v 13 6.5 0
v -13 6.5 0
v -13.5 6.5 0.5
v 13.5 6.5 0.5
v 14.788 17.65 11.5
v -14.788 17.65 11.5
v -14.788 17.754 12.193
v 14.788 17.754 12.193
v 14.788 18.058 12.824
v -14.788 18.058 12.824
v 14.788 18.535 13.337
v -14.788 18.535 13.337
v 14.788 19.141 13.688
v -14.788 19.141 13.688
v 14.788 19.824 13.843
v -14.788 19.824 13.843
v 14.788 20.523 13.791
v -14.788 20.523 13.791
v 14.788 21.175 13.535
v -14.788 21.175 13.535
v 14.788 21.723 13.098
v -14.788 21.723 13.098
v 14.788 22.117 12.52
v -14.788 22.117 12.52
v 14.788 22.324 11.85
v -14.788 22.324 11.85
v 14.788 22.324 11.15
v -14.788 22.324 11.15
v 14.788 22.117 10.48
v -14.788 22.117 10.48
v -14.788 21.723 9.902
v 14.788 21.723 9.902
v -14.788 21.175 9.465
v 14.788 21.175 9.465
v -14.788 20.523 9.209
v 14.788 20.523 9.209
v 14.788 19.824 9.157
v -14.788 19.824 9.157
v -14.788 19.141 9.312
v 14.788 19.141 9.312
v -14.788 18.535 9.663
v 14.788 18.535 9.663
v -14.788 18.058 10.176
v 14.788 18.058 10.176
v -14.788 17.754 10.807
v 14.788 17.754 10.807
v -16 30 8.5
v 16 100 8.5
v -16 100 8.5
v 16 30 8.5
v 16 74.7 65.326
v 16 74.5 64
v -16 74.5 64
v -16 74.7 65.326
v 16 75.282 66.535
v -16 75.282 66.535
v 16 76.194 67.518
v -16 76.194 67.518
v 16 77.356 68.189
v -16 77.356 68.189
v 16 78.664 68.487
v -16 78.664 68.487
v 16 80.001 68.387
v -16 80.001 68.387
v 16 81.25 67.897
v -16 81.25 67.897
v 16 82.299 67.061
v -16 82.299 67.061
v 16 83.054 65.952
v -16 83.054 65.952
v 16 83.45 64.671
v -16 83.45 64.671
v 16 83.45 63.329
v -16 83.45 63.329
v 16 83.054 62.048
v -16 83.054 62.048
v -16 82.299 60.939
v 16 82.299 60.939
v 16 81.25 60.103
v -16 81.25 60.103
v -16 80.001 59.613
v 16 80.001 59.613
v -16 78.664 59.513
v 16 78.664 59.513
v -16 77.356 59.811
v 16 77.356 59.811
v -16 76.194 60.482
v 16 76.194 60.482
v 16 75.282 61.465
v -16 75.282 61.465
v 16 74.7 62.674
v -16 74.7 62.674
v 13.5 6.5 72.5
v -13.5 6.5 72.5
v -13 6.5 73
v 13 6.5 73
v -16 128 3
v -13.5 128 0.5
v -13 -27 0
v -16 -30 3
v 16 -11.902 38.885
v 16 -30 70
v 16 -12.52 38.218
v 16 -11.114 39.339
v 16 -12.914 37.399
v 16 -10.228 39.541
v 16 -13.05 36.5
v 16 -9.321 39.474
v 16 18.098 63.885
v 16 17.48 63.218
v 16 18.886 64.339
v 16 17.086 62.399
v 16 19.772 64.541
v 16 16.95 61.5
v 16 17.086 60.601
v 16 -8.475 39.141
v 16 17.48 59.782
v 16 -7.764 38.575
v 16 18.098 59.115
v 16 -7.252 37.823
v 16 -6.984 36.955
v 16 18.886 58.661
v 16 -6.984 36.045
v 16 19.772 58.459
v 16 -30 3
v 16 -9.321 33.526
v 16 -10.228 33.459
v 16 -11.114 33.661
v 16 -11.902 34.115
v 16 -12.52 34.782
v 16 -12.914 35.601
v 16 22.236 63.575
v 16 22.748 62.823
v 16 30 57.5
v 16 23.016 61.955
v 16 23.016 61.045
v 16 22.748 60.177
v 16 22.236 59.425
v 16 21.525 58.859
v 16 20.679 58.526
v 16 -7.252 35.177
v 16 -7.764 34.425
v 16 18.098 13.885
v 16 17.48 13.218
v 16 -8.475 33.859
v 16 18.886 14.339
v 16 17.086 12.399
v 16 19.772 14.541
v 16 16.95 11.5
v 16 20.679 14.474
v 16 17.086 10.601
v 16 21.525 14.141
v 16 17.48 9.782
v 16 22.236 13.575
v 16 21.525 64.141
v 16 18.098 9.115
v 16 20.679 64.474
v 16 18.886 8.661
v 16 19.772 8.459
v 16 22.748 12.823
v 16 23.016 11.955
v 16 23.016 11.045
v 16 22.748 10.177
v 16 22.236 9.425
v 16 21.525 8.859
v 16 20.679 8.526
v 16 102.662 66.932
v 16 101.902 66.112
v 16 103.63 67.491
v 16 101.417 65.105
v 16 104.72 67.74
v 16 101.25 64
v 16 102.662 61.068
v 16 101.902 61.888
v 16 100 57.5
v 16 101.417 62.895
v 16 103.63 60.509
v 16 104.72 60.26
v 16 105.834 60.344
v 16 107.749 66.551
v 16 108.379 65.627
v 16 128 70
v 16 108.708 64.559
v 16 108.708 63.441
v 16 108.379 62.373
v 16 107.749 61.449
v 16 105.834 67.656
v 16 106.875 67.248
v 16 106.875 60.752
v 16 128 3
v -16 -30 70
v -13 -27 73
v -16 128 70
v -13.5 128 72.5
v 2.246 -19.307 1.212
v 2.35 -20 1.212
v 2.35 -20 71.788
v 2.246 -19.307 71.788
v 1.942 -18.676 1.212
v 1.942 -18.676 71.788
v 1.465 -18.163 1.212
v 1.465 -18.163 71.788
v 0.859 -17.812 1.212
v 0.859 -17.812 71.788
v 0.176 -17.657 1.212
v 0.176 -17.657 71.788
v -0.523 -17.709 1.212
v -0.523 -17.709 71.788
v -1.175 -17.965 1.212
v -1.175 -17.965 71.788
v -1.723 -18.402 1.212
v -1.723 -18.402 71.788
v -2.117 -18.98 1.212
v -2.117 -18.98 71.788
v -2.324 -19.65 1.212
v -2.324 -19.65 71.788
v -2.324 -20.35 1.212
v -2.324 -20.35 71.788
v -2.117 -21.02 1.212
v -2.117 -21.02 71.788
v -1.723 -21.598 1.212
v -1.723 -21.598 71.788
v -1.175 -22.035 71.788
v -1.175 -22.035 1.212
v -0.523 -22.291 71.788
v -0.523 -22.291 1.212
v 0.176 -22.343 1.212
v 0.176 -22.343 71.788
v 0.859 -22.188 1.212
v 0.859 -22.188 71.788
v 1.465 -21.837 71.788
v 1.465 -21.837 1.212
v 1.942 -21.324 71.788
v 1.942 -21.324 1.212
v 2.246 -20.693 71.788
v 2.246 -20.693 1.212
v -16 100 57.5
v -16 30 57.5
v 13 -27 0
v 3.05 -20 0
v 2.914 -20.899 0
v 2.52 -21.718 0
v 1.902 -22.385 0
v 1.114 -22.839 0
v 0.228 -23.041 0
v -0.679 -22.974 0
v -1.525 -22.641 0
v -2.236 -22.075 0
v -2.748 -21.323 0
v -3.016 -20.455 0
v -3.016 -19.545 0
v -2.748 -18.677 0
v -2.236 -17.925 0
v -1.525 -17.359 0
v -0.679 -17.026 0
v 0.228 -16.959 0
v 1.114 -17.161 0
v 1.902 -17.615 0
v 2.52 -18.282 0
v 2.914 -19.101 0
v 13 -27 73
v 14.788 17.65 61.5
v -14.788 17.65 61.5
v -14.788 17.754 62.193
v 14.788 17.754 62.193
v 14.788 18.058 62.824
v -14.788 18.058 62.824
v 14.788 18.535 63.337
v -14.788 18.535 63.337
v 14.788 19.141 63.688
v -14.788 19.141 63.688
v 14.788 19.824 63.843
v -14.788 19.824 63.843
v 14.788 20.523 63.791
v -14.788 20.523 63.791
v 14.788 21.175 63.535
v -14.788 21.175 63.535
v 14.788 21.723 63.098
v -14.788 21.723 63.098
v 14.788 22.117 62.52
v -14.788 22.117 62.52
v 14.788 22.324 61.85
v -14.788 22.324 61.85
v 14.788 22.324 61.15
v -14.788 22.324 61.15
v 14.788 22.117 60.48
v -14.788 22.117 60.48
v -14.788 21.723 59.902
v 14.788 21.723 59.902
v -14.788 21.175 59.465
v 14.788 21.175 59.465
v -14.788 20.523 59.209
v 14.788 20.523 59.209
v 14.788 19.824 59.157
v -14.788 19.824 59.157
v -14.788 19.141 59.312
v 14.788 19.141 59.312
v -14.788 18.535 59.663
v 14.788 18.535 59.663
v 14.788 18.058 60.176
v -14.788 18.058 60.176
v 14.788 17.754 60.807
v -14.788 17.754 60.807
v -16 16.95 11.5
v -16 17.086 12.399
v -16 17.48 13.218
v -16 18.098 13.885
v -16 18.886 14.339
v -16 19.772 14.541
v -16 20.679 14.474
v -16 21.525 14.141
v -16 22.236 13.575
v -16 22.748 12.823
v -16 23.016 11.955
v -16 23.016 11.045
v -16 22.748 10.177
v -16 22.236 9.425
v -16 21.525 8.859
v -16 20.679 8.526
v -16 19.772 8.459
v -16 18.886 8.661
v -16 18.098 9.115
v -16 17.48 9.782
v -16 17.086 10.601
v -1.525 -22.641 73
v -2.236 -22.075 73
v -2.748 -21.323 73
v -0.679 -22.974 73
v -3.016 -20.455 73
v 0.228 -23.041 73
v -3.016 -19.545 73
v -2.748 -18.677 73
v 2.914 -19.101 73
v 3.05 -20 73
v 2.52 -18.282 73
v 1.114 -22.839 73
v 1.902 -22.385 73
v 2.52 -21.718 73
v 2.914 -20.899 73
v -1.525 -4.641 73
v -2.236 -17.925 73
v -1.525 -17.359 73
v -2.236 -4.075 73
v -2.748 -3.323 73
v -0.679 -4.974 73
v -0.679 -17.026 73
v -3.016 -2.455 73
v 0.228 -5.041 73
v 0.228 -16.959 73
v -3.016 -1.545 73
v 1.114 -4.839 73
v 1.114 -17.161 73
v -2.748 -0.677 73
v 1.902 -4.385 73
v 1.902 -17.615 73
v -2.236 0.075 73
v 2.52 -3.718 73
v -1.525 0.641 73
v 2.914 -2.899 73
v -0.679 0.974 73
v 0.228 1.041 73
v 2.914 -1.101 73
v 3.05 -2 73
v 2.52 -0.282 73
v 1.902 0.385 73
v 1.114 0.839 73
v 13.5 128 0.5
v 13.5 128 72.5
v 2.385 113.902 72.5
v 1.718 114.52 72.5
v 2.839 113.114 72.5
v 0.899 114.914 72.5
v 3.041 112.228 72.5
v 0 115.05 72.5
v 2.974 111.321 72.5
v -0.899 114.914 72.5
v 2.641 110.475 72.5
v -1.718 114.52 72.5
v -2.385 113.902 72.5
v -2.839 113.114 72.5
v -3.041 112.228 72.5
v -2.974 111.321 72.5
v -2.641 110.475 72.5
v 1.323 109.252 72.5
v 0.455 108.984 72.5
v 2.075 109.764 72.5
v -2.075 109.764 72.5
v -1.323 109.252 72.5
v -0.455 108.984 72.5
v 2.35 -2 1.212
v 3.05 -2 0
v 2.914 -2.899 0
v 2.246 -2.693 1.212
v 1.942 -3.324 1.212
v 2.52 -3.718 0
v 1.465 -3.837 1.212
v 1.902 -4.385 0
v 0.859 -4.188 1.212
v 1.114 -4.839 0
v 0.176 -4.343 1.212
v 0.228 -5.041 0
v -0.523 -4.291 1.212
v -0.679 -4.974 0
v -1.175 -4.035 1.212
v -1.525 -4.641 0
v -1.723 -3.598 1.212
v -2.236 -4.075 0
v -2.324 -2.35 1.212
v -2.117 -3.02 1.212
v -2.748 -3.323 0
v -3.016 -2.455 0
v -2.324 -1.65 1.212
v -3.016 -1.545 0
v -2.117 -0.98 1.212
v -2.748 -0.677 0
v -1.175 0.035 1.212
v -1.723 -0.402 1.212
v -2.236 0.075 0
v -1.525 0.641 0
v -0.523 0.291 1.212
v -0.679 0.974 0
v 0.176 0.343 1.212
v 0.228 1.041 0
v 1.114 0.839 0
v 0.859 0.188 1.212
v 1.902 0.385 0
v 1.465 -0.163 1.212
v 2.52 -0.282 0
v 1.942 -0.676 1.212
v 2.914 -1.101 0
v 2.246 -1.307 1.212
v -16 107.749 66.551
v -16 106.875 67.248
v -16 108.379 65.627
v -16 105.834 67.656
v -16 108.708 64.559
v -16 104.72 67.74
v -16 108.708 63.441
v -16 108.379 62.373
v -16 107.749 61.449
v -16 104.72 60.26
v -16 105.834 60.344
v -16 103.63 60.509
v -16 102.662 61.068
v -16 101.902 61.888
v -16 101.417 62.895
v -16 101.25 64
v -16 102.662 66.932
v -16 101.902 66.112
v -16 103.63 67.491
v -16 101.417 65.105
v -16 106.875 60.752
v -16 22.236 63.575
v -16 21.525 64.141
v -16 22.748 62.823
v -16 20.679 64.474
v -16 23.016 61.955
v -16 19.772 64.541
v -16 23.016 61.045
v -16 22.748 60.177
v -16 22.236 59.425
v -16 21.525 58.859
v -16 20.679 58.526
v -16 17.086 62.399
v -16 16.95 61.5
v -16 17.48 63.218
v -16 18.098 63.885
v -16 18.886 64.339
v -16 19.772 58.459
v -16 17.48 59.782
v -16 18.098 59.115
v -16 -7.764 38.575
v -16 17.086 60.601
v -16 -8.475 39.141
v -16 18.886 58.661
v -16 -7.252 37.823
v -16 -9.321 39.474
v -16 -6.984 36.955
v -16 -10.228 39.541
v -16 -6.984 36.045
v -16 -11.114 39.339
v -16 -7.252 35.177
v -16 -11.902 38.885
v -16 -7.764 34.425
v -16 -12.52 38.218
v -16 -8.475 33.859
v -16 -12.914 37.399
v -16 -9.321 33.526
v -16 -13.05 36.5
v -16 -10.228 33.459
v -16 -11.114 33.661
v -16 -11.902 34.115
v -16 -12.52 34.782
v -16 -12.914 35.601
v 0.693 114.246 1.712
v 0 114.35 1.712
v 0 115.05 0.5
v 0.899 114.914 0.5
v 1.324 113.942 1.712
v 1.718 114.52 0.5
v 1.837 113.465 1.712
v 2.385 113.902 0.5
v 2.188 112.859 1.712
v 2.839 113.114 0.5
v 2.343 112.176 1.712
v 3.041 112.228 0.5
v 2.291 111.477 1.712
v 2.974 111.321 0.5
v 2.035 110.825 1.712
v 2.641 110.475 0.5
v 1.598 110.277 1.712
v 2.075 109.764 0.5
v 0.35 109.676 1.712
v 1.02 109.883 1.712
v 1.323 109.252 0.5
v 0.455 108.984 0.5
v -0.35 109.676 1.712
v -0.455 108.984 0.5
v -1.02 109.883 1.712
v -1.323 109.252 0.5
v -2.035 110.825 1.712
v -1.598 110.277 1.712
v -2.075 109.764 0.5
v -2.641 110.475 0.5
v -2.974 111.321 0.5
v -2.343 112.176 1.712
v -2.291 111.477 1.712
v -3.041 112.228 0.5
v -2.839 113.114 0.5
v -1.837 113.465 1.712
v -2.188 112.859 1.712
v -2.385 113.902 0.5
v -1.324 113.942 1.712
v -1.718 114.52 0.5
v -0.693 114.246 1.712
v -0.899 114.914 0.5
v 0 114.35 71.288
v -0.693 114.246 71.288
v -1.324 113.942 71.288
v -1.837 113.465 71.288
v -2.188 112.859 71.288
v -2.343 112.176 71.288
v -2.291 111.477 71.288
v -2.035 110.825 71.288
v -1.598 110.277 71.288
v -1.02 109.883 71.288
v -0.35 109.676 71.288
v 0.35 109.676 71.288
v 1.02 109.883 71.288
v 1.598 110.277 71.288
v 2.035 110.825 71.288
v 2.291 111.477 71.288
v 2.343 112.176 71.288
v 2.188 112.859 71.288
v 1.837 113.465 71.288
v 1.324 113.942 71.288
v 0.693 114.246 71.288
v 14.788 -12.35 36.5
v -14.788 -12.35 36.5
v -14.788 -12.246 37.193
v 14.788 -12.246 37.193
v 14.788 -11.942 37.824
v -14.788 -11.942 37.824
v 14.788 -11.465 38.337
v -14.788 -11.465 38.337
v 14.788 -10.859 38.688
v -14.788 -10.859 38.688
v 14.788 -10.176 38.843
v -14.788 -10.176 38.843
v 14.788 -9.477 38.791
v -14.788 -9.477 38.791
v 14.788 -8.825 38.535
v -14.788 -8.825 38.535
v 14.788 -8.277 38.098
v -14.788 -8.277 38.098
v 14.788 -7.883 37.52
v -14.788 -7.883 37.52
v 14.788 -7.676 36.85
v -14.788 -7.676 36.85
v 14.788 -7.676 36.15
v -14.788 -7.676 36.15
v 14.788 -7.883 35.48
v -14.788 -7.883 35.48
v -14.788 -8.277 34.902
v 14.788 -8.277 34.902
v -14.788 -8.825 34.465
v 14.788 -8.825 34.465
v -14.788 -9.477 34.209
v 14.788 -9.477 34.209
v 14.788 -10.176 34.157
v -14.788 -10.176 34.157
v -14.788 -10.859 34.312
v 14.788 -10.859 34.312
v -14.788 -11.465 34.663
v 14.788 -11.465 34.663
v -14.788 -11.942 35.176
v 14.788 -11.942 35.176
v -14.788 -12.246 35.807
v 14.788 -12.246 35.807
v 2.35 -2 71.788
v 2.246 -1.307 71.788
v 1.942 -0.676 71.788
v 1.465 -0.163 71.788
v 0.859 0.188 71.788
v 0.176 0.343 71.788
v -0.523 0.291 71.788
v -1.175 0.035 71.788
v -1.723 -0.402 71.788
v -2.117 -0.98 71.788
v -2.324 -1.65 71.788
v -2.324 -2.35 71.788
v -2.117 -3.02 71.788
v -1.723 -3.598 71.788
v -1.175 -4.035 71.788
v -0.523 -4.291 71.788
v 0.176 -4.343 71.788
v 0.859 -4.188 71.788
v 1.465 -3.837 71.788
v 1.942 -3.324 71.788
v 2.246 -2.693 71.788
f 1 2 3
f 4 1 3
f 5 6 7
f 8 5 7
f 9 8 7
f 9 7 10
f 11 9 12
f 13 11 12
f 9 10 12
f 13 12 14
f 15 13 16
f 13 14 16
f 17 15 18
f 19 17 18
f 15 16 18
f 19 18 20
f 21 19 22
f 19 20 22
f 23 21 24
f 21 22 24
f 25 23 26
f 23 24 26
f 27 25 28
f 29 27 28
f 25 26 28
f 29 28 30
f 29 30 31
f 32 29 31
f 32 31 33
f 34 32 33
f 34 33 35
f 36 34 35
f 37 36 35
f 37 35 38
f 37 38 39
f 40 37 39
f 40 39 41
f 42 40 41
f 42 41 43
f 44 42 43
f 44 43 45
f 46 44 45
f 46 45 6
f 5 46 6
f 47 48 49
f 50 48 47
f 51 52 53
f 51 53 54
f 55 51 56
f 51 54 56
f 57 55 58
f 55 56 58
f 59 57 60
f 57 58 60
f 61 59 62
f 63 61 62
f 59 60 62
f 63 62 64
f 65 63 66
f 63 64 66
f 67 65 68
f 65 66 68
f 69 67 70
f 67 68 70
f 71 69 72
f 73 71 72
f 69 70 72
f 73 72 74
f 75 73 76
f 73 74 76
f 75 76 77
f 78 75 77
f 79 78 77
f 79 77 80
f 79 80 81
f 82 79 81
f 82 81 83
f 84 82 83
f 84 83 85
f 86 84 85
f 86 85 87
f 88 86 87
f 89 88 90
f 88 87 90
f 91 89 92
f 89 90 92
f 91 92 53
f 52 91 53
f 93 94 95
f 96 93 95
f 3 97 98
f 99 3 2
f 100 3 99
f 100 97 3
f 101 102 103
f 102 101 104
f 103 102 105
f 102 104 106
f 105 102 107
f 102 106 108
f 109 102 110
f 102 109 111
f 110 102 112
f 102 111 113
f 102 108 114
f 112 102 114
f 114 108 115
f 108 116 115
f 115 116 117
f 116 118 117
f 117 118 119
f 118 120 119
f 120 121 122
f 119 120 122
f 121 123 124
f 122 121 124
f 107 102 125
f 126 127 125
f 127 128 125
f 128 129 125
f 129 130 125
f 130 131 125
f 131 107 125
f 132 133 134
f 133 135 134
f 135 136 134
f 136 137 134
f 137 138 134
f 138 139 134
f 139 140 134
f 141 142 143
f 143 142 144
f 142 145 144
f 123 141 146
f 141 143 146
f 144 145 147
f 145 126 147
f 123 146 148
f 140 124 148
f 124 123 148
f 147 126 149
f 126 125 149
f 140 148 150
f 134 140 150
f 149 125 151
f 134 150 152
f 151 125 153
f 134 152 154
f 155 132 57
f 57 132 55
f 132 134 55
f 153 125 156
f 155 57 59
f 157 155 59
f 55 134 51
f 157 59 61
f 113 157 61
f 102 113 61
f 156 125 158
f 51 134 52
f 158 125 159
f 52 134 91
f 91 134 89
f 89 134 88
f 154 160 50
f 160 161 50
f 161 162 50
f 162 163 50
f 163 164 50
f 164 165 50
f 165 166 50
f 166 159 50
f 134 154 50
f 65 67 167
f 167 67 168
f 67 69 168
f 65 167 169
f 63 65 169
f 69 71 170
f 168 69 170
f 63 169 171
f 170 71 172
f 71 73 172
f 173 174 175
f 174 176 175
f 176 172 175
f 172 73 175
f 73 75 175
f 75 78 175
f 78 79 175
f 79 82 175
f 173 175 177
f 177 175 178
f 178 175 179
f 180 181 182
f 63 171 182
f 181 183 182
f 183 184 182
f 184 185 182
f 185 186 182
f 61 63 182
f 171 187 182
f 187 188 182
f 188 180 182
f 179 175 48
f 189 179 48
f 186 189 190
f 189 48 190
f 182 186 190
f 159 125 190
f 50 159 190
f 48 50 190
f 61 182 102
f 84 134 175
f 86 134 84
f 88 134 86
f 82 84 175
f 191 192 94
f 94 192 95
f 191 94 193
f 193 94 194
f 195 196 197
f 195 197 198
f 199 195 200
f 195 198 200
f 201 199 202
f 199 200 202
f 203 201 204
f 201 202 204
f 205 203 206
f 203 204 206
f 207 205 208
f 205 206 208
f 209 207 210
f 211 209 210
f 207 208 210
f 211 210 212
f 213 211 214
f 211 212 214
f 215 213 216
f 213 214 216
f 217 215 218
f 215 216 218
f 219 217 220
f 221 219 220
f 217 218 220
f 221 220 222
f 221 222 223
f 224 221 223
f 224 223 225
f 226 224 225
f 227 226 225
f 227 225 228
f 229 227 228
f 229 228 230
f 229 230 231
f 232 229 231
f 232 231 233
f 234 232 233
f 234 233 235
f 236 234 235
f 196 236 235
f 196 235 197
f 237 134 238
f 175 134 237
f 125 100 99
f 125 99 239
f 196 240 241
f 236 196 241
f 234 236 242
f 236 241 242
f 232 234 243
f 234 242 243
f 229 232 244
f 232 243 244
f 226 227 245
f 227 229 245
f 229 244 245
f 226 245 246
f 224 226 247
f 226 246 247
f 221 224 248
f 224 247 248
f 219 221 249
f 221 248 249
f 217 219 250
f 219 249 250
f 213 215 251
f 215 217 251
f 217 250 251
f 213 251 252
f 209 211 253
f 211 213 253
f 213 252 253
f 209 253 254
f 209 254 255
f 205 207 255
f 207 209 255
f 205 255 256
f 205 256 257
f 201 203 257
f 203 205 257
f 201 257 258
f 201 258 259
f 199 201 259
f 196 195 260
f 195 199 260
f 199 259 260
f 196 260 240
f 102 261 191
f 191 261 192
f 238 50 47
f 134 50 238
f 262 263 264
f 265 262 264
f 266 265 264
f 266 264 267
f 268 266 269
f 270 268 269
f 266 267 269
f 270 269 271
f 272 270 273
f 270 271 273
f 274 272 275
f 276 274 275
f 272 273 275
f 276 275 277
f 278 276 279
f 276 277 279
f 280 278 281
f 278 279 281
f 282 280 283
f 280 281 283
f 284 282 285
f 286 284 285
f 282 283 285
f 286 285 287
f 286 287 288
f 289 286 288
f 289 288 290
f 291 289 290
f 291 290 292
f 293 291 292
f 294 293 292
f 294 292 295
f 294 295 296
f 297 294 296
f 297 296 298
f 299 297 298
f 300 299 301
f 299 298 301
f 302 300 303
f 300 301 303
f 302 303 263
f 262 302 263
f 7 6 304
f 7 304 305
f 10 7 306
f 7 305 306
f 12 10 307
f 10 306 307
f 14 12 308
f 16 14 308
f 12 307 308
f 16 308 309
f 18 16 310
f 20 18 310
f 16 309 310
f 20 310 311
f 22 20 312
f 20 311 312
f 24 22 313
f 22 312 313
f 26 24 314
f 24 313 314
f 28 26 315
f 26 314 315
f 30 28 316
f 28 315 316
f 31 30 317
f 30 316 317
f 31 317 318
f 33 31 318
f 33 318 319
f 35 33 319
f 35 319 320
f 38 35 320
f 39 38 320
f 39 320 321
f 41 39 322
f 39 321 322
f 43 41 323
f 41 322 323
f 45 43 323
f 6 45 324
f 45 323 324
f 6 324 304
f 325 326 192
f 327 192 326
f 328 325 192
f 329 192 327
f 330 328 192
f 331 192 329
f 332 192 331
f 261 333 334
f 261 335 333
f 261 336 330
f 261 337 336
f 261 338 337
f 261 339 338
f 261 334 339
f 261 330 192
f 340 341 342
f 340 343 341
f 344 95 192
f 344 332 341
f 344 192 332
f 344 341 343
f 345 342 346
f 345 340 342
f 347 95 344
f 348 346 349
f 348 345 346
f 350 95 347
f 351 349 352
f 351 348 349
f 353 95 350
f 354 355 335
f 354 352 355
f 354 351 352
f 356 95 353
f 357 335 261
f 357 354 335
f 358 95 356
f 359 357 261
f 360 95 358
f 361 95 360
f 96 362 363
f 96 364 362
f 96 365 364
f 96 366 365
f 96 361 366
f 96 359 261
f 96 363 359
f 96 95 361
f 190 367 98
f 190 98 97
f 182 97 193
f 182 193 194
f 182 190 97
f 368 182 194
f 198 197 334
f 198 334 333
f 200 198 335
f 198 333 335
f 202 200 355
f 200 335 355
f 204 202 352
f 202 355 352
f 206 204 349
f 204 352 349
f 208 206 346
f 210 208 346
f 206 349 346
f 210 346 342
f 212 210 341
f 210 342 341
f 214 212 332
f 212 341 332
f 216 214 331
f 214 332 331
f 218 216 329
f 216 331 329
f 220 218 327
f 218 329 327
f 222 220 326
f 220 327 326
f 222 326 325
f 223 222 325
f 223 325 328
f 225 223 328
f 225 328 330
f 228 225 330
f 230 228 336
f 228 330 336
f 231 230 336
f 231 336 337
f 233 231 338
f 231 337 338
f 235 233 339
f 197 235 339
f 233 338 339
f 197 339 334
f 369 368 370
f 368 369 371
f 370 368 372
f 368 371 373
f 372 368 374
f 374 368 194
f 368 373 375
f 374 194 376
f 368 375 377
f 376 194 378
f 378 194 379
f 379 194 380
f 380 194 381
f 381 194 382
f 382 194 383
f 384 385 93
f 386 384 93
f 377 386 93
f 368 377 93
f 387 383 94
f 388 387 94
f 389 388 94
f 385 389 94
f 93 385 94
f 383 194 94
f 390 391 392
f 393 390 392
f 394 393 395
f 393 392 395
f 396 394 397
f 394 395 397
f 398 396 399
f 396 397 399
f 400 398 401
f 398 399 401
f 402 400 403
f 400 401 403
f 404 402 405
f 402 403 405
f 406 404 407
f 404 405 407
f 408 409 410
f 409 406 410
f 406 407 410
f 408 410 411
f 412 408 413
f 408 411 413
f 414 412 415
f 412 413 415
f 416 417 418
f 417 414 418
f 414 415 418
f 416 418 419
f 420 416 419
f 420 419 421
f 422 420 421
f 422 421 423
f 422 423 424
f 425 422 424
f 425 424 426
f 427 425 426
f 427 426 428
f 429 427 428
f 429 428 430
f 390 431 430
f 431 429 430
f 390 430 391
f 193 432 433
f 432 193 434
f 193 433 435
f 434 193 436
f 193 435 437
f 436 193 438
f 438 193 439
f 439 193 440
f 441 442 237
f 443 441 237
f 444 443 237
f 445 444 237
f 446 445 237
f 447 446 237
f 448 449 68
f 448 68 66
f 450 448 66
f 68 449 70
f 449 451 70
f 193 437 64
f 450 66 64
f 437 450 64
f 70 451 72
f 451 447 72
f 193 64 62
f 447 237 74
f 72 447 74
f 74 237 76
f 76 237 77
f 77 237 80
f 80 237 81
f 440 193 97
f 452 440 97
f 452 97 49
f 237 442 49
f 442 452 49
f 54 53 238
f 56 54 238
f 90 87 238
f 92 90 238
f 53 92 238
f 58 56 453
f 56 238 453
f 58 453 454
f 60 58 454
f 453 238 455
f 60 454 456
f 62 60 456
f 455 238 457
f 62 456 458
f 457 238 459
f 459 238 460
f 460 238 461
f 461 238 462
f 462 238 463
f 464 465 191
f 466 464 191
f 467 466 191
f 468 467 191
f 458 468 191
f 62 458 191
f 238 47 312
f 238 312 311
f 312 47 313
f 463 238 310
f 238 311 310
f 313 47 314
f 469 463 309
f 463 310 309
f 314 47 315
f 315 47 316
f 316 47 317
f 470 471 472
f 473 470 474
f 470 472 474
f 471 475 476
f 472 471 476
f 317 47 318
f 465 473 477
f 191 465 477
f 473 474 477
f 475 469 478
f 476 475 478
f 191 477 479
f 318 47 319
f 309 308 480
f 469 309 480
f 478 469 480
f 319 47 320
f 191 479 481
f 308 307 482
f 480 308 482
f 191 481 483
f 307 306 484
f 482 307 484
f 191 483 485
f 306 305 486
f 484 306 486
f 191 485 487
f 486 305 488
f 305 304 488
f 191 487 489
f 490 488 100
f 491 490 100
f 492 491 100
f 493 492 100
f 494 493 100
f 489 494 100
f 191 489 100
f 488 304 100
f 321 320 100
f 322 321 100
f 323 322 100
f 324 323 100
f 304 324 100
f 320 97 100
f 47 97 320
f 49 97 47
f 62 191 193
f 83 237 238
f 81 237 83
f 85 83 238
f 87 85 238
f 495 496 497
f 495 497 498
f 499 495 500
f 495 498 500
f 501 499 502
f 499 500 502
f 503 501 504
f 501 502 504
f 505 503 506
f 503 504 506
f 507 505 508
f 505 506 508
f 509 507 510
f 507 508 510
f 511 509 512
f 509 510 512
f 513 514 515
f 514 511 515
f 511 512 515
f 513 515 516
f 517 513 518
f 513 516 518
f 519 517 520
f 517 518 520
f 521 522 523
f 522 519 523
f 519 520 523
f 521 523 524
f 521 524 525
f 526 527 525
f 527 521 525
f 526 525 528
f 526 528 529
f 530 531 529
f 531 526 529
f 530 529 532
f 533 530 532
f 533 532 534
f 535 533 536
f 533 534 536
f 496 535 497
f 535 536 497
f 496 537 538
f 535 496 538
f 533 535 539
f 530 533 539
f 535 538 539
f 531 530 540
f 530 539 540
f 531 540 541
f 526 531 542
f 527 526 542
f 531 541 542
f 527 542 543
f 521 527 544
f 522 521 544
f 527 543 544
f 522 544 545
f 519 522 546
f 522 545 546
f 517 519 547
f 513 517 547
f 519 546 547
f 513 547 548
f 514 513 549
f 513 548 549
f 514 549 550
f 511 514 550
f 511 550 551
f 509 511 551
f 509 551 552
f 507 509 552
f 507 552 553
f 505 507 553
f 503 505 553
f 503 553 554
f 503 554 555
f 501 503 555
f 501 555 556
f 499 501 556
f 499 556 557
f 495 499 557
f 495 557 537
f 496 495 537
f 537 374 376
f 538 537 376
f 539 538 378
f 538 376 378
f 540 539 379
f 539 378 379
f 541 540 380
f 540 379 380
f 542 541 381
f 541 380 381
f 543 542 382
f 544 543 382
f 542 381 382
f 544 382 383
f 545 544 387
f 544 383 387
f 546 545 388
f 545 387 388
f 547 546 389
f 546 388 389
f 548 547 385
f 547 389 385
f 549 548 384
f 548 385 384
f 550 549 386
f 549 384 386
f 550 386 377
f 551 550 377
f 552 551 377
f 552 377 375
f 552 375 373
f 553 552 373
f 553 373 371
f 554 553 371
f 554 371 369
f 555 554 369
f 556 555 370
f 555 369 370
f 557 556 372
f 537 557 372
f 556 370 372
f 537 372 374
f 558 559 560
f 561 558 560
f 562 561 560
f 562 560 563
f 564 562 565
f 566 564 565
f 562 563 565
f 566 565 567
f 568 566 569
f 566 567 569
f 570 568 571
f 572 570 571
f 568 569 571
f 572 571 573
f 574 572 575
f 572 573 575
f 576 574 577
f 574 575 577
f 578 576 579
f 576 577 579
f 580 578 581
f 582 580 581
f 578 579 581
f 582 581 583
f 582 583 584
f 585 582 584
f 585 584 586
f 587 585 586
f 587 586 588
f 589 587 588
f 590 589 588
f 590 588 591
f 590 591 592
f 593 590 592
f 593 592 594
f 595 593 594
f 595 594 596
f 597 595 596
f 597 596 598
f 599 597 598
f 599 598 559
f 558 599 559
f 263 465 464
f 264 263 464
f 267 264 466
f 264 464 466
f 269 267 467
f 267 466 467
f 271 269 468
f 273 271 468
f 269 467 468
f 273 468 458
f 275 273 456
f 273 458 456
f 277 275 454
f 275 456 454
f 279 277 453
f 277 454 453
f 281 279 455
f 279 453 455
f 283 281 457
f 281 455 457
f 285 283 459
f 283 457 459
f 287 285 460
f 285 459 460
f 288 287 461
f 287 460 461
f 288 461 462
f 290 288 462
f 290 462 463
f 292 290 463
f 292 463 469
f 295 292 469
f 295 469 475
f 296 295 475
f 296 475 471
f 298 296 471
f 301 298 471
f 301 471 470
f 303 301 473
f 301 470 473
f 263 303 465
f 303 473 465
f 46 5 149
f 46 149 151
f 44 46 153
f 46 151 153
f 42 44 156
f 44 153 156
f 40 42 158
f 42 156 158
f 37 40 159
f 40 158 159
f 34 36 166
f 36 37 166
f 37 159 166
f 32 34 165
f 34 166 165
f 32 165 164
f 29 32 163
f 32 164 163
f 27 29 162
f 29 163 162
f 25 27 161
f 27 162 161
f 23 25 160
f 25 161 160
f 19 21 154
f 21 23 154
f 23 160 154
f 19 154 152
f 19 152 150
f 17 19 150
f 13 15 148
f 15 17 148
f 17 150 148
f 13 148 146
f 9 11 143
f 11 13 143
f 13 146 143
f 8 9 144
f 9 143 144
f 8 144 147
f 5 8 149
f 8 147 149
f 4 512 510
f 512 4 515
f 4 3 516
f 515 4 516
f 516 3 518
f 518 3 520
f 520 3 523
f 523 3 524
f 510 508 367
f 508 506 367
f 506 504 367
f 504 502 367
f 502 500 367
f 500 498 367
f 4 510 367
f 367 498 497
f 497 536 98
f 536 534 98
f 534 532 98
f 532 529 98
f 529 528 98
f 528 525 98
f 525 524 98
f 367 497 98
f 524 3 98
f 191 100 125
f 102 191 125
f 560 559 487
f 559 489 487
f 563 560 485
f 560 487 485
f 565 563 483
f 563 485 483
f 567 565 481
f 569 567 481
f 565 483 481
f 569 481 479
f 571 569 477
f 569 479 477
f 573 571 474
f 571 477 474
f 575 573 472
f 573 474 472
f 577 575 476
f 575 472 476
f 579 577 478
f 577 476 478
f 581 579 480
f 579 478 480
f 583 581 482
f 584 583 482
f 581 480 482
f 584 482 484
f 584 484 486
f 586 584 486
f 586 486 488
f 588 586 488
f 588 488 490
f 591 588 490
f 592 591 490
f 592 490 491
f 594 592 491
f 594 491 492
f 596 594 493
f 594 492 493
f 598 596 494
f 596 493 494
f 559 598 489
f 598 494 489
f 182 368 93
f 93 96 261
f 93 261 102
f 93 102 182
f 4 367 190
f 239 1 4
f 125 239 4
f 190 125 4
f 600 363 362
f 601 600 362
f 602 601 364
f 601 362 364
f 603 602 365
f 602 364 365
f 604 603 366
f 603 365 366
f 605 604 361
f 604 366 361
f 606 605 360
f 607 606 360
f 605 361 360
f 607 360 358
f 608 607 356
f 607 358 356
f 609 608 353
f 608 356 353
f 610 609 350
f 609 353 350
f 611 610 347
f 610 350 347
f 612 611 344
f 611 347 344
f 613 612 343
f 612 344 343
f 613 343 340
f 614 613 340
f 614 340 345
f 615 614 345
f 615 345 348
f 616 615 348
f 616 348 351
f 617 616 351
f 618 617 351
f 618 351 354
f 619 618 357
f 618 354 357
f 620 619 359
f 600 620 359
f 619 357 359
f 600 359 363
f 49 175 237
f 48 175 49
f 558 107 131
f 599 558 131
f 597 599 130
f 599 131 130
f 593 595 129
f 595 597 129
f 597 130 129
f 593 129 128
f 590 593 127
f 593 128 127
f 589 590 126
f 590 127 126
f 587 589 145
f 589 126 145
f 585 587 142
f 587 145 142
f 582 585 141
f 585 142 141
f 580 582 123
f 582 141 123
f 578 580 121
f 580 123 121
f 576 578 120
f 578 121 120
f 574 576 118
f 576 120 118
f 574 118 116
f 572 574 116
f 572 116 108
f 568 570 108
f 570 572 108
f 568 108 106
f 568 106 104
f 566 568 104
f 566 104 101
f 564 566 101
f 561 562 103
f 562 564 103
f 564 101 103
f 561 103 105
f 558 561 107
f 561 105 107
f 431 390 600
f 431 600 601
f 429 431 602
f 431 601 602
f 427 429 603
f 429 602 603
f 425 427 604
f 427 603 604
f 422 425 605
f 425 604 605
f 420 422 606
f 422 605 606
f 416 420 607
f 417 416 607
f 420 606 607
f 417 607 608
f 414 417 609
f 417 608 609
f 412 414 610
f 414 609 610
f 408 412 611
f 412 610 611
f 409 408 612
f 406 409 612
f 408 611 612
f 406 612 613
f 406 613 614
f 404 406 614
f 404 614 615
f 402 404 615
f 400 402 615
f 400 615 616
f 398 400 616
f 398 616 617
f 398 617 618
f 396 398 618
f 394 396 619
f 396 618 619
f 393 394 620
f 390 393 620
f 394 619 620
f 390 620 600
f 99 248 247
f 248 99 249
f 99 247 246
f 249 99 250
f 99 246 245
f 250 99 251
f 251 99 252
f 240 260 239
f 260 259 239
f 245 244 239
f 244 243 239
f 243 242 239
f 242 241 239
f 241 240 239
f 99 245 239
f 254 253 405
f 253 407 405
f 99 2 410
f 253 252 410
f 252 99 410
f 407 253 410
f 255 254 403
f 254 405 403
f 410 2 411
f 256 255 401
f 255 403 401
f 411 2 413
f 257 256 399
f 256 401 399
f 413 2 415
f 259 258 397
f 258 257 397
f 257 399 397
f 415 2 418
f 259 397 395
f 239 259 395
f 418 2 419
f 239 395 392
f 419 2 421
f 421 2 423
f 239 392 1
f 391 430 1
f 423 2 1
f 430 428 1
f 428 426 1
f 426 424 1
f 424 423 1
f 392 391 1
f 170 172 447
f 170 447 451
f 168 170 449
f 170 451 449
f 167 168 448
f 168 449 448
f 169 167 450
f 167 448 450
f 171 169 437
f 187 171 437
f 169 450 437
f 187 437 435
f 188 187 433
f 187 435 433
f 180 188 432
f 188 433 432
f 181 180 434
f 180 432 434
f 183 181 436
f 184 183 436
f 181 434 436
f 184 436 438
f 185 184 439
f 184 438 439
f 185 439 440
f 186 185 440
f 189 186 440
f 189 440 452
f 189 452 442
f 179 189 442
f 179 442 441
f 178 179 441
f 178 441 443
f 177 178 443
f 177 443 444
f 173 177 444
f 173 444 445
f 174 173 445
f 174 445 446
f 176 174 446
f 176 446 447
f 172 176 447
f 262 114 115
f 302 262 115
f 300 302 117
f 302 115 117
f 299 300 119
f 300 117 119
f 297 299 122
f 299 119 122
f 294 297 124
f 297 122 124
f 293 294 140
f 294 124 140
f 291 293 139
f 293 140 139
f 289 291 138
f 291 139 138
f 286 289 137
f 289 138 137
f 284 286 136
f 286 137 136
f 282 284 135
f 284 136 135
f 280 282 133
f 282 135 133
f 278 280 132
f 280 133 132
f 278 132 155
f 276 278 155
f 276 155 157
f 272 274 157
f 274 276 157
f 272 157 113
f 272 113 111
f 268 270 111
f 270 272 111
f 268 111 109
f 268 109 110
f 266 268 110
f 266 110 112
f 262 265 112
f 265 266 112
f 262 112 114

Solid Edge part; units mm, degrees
sketch "Sketch1" plane through (0, 0, 0) normal (0, 0, 1) x (1, 0, 0)
  line L0 (-16, -30) -> (16, -30)
  line L1 (16, -30) -> (16, 30)
  line L2 (16, 30) -> (-16, 30)
  line L3 (-16, 30) -> (-16, -30)
  dimension "D1" = 32
  dimension "D2" = 60
extrude "Protrusion1" add sketch "Sketch1" along normal blind 73
sketch "Sketch2" plane through (0, 0, 73) normal (0, 0, 1) x (1, 0, 0)
  circle A0 centre (0, -20) radius 2.35
  circle A1 centre (0, -2) radius 2.35
  dimension "D1" = 4.7
  dimension "D2" = 18
  dimension "D3" = 10
extrude "Cutout1" cut sketch "Sketch2" against normal through all
chamfer "Fase_3" distance 0.7 angle 60 4 edges at (-2.35, -2, 73) (-2.35, -20, 73) (-2.35, -20, 0) (-2.35, -2, 0) measured on face at (-10.9867, -19.4, 73) measured on face at (-10.9867, -19.4, 0)
chamfer "Fase_6" distance 3 angle 45 4 edges at (-16, 0, 73) (-16, 0, 0) (16, 0, 73) (16, 0, 0)
chamfer "Fase_7" distance 3 angle 45 2 edges at (0, -30, 73) (0, -30, 0)
sketch "Sketch3" plane through (-16, 0, 36.5) normal (-1, 0, 0) x (0, -1, 0)
  circle A0 centre (-20, 25) radius 2.35
  circle A1 centre (-20, -25) radius 2.35
  circle A2 centre (10, 0) radius 2.35
  dimension "D1" = 4.7
  dimension "D2" = 50
  dimension "D3" = 10
  dimension "D4" = 30
extrude "Cutout2" cut sketch "Sketch3" against normal through all
chamfer "Fase_9" distance 0.7 angle 60 6 edges at (-16, 22.35, 61.5) (-16, -7.65, 36.5) (-16, 22.35, 11.5) (16, 20, 59.15) (16, 20, 9.15) (16, -10, 34.15) measured on face at (-16, 20.6, 58.1633) measured on face at (16, -20.6, 58.1633)
sketch "Sketch4" plane through (-16, 0, 36.5) normal (-1, 0, 0) x (0, -1, 0)
  line L0 (-6.5, 36.5) -> (-30, 36.5)
  line L1 (-30, 36.5) -> (-30, 36)
  line L2 (-30, 36) -> (-6.5, 36)
  line L3 (-6.5, 36) -> (-6.5, 36.5)
  line L4 (-30, -36.5) -> (-6.5, -36.5)
  line L5 (-6.5, -36.5) -> (-6.5, -36)
  line L6 (-6.5, -36) -> (-30, -36)
  line L7 (-30, -36) -> (-30, -36.5)
  dimension "D1" = 0.5
  dimension "D2" = 36.5
  dimension "D3" = 0.5
  dimension "D4" = 36.5
extrude "Cutout3" cut sketch "Sketch4" against normal through all
sketch "Sketch5" plane through (0, 30, 36.5) normal (0, 1, 0) x (1, 0, 0)
  line L0 (-16, 33.5) -> (-13.5, 36)
  line L1 (-13.5, 36) -> (13.5, 36)
  line L2 (13.5, 36) -> (16, 33.5)
  line L3 (16, 33.5) -> (16, -33.5)
  line L4 (16, -33.5) -> (13.5, -36)
  line L5 (13.5, -36) -> (-13.5, -36)
  line L6 (-13.5, -36) -> (-16, -33.5)
  line L7 (-16, -33.5) -> (-16, 33.5)
extrude "Extrusionsausprägung_2" add sketch "Sketch5" along normal blind 26
sketch "Sketch6" plane through (0, 56, 36.5) normal (0, 1, 0) x (-1, 0, 0)
  line L0 (-13.5, 36) -> (-16, 33.5)
  line L1 (-16, 33.5) -> (-16, -33.5)
  line L2 (-16, -33.5) -> (-13.5, -36)
  line L3 (-13.5, -36) -> (13.5, -36)
  line L4 (13.5, -36) -> (16, -33.5)
  line L5 (16, -33.5) -> (16, 33.5)
  line L6 (16, 33.5) -> (13.5, 36)
  line L7 (13.5, 36) -> (-13.5, 36)
extrude "Extrusionsausprägung_3" add sketch "Sketch6" along normal blind 72
sketch "Sketch7" plane through (16, 47, 36.5) normal (1, 0, 0) x (0, 1, 0)
  line L0 (-17, 21) -> (53, 21)
  line L1 (53, 21) -> (53, -28)
  line L2 (53, -28) -> (-17, -28)
  line L3 (-17, -28) -> (-17, 21)
  dimension "D1" = 10
  dimension "D2" = 70
  dimension "D3" = 15
  dimension "D4" = 8
extrude "Cutout4" cut sketch "Sketch7" against normal through all
sketch "Sketch8" plane through (0, 65.25, 72.5) normal (0, 0, 1) x (0, 1, 0)
  circle A0 centre (46.75, 0) radius 2.35
  dimension "D1" = 4.7
  dimension "D2" = 16
extrude "Cutout5" cut sketch "Sketch8" against normal through all
chamfer "Fase_11" distance 0.7 angle 60 2 edges at (-2.35, 112, 0.5) (0, 109.65, 72.5) measured on face at (8.73, 108.965, 72.5) measured on face at (8.73, 25.535, 0.5)
sketch "Sketch9" plane through (-16, 49, 36.5) normal (-1, 0, 0) x (0, -1, 0)
  circle A0 centre (-56, 27.5) radius 3.75
  dimension "D1" = 7
  dimension "D2" = 7.5
  dimension "D3" = 8.5
extrude "Cutout6" cut sketch "Sketch9" against normal through all
sketch "Sketch10" plane through (-16, 49, 36.5) normal (-1, 0, 0) x (0, -1, 0)
  circle A0 centre (-30, 27.5) radius 4.5
  dimension "D1" = 9
  dimension "D2" = 26
extrude "Cutout7" cut sketch "Sketch10" against normal through all
properties material "Nylon, allgemein"
